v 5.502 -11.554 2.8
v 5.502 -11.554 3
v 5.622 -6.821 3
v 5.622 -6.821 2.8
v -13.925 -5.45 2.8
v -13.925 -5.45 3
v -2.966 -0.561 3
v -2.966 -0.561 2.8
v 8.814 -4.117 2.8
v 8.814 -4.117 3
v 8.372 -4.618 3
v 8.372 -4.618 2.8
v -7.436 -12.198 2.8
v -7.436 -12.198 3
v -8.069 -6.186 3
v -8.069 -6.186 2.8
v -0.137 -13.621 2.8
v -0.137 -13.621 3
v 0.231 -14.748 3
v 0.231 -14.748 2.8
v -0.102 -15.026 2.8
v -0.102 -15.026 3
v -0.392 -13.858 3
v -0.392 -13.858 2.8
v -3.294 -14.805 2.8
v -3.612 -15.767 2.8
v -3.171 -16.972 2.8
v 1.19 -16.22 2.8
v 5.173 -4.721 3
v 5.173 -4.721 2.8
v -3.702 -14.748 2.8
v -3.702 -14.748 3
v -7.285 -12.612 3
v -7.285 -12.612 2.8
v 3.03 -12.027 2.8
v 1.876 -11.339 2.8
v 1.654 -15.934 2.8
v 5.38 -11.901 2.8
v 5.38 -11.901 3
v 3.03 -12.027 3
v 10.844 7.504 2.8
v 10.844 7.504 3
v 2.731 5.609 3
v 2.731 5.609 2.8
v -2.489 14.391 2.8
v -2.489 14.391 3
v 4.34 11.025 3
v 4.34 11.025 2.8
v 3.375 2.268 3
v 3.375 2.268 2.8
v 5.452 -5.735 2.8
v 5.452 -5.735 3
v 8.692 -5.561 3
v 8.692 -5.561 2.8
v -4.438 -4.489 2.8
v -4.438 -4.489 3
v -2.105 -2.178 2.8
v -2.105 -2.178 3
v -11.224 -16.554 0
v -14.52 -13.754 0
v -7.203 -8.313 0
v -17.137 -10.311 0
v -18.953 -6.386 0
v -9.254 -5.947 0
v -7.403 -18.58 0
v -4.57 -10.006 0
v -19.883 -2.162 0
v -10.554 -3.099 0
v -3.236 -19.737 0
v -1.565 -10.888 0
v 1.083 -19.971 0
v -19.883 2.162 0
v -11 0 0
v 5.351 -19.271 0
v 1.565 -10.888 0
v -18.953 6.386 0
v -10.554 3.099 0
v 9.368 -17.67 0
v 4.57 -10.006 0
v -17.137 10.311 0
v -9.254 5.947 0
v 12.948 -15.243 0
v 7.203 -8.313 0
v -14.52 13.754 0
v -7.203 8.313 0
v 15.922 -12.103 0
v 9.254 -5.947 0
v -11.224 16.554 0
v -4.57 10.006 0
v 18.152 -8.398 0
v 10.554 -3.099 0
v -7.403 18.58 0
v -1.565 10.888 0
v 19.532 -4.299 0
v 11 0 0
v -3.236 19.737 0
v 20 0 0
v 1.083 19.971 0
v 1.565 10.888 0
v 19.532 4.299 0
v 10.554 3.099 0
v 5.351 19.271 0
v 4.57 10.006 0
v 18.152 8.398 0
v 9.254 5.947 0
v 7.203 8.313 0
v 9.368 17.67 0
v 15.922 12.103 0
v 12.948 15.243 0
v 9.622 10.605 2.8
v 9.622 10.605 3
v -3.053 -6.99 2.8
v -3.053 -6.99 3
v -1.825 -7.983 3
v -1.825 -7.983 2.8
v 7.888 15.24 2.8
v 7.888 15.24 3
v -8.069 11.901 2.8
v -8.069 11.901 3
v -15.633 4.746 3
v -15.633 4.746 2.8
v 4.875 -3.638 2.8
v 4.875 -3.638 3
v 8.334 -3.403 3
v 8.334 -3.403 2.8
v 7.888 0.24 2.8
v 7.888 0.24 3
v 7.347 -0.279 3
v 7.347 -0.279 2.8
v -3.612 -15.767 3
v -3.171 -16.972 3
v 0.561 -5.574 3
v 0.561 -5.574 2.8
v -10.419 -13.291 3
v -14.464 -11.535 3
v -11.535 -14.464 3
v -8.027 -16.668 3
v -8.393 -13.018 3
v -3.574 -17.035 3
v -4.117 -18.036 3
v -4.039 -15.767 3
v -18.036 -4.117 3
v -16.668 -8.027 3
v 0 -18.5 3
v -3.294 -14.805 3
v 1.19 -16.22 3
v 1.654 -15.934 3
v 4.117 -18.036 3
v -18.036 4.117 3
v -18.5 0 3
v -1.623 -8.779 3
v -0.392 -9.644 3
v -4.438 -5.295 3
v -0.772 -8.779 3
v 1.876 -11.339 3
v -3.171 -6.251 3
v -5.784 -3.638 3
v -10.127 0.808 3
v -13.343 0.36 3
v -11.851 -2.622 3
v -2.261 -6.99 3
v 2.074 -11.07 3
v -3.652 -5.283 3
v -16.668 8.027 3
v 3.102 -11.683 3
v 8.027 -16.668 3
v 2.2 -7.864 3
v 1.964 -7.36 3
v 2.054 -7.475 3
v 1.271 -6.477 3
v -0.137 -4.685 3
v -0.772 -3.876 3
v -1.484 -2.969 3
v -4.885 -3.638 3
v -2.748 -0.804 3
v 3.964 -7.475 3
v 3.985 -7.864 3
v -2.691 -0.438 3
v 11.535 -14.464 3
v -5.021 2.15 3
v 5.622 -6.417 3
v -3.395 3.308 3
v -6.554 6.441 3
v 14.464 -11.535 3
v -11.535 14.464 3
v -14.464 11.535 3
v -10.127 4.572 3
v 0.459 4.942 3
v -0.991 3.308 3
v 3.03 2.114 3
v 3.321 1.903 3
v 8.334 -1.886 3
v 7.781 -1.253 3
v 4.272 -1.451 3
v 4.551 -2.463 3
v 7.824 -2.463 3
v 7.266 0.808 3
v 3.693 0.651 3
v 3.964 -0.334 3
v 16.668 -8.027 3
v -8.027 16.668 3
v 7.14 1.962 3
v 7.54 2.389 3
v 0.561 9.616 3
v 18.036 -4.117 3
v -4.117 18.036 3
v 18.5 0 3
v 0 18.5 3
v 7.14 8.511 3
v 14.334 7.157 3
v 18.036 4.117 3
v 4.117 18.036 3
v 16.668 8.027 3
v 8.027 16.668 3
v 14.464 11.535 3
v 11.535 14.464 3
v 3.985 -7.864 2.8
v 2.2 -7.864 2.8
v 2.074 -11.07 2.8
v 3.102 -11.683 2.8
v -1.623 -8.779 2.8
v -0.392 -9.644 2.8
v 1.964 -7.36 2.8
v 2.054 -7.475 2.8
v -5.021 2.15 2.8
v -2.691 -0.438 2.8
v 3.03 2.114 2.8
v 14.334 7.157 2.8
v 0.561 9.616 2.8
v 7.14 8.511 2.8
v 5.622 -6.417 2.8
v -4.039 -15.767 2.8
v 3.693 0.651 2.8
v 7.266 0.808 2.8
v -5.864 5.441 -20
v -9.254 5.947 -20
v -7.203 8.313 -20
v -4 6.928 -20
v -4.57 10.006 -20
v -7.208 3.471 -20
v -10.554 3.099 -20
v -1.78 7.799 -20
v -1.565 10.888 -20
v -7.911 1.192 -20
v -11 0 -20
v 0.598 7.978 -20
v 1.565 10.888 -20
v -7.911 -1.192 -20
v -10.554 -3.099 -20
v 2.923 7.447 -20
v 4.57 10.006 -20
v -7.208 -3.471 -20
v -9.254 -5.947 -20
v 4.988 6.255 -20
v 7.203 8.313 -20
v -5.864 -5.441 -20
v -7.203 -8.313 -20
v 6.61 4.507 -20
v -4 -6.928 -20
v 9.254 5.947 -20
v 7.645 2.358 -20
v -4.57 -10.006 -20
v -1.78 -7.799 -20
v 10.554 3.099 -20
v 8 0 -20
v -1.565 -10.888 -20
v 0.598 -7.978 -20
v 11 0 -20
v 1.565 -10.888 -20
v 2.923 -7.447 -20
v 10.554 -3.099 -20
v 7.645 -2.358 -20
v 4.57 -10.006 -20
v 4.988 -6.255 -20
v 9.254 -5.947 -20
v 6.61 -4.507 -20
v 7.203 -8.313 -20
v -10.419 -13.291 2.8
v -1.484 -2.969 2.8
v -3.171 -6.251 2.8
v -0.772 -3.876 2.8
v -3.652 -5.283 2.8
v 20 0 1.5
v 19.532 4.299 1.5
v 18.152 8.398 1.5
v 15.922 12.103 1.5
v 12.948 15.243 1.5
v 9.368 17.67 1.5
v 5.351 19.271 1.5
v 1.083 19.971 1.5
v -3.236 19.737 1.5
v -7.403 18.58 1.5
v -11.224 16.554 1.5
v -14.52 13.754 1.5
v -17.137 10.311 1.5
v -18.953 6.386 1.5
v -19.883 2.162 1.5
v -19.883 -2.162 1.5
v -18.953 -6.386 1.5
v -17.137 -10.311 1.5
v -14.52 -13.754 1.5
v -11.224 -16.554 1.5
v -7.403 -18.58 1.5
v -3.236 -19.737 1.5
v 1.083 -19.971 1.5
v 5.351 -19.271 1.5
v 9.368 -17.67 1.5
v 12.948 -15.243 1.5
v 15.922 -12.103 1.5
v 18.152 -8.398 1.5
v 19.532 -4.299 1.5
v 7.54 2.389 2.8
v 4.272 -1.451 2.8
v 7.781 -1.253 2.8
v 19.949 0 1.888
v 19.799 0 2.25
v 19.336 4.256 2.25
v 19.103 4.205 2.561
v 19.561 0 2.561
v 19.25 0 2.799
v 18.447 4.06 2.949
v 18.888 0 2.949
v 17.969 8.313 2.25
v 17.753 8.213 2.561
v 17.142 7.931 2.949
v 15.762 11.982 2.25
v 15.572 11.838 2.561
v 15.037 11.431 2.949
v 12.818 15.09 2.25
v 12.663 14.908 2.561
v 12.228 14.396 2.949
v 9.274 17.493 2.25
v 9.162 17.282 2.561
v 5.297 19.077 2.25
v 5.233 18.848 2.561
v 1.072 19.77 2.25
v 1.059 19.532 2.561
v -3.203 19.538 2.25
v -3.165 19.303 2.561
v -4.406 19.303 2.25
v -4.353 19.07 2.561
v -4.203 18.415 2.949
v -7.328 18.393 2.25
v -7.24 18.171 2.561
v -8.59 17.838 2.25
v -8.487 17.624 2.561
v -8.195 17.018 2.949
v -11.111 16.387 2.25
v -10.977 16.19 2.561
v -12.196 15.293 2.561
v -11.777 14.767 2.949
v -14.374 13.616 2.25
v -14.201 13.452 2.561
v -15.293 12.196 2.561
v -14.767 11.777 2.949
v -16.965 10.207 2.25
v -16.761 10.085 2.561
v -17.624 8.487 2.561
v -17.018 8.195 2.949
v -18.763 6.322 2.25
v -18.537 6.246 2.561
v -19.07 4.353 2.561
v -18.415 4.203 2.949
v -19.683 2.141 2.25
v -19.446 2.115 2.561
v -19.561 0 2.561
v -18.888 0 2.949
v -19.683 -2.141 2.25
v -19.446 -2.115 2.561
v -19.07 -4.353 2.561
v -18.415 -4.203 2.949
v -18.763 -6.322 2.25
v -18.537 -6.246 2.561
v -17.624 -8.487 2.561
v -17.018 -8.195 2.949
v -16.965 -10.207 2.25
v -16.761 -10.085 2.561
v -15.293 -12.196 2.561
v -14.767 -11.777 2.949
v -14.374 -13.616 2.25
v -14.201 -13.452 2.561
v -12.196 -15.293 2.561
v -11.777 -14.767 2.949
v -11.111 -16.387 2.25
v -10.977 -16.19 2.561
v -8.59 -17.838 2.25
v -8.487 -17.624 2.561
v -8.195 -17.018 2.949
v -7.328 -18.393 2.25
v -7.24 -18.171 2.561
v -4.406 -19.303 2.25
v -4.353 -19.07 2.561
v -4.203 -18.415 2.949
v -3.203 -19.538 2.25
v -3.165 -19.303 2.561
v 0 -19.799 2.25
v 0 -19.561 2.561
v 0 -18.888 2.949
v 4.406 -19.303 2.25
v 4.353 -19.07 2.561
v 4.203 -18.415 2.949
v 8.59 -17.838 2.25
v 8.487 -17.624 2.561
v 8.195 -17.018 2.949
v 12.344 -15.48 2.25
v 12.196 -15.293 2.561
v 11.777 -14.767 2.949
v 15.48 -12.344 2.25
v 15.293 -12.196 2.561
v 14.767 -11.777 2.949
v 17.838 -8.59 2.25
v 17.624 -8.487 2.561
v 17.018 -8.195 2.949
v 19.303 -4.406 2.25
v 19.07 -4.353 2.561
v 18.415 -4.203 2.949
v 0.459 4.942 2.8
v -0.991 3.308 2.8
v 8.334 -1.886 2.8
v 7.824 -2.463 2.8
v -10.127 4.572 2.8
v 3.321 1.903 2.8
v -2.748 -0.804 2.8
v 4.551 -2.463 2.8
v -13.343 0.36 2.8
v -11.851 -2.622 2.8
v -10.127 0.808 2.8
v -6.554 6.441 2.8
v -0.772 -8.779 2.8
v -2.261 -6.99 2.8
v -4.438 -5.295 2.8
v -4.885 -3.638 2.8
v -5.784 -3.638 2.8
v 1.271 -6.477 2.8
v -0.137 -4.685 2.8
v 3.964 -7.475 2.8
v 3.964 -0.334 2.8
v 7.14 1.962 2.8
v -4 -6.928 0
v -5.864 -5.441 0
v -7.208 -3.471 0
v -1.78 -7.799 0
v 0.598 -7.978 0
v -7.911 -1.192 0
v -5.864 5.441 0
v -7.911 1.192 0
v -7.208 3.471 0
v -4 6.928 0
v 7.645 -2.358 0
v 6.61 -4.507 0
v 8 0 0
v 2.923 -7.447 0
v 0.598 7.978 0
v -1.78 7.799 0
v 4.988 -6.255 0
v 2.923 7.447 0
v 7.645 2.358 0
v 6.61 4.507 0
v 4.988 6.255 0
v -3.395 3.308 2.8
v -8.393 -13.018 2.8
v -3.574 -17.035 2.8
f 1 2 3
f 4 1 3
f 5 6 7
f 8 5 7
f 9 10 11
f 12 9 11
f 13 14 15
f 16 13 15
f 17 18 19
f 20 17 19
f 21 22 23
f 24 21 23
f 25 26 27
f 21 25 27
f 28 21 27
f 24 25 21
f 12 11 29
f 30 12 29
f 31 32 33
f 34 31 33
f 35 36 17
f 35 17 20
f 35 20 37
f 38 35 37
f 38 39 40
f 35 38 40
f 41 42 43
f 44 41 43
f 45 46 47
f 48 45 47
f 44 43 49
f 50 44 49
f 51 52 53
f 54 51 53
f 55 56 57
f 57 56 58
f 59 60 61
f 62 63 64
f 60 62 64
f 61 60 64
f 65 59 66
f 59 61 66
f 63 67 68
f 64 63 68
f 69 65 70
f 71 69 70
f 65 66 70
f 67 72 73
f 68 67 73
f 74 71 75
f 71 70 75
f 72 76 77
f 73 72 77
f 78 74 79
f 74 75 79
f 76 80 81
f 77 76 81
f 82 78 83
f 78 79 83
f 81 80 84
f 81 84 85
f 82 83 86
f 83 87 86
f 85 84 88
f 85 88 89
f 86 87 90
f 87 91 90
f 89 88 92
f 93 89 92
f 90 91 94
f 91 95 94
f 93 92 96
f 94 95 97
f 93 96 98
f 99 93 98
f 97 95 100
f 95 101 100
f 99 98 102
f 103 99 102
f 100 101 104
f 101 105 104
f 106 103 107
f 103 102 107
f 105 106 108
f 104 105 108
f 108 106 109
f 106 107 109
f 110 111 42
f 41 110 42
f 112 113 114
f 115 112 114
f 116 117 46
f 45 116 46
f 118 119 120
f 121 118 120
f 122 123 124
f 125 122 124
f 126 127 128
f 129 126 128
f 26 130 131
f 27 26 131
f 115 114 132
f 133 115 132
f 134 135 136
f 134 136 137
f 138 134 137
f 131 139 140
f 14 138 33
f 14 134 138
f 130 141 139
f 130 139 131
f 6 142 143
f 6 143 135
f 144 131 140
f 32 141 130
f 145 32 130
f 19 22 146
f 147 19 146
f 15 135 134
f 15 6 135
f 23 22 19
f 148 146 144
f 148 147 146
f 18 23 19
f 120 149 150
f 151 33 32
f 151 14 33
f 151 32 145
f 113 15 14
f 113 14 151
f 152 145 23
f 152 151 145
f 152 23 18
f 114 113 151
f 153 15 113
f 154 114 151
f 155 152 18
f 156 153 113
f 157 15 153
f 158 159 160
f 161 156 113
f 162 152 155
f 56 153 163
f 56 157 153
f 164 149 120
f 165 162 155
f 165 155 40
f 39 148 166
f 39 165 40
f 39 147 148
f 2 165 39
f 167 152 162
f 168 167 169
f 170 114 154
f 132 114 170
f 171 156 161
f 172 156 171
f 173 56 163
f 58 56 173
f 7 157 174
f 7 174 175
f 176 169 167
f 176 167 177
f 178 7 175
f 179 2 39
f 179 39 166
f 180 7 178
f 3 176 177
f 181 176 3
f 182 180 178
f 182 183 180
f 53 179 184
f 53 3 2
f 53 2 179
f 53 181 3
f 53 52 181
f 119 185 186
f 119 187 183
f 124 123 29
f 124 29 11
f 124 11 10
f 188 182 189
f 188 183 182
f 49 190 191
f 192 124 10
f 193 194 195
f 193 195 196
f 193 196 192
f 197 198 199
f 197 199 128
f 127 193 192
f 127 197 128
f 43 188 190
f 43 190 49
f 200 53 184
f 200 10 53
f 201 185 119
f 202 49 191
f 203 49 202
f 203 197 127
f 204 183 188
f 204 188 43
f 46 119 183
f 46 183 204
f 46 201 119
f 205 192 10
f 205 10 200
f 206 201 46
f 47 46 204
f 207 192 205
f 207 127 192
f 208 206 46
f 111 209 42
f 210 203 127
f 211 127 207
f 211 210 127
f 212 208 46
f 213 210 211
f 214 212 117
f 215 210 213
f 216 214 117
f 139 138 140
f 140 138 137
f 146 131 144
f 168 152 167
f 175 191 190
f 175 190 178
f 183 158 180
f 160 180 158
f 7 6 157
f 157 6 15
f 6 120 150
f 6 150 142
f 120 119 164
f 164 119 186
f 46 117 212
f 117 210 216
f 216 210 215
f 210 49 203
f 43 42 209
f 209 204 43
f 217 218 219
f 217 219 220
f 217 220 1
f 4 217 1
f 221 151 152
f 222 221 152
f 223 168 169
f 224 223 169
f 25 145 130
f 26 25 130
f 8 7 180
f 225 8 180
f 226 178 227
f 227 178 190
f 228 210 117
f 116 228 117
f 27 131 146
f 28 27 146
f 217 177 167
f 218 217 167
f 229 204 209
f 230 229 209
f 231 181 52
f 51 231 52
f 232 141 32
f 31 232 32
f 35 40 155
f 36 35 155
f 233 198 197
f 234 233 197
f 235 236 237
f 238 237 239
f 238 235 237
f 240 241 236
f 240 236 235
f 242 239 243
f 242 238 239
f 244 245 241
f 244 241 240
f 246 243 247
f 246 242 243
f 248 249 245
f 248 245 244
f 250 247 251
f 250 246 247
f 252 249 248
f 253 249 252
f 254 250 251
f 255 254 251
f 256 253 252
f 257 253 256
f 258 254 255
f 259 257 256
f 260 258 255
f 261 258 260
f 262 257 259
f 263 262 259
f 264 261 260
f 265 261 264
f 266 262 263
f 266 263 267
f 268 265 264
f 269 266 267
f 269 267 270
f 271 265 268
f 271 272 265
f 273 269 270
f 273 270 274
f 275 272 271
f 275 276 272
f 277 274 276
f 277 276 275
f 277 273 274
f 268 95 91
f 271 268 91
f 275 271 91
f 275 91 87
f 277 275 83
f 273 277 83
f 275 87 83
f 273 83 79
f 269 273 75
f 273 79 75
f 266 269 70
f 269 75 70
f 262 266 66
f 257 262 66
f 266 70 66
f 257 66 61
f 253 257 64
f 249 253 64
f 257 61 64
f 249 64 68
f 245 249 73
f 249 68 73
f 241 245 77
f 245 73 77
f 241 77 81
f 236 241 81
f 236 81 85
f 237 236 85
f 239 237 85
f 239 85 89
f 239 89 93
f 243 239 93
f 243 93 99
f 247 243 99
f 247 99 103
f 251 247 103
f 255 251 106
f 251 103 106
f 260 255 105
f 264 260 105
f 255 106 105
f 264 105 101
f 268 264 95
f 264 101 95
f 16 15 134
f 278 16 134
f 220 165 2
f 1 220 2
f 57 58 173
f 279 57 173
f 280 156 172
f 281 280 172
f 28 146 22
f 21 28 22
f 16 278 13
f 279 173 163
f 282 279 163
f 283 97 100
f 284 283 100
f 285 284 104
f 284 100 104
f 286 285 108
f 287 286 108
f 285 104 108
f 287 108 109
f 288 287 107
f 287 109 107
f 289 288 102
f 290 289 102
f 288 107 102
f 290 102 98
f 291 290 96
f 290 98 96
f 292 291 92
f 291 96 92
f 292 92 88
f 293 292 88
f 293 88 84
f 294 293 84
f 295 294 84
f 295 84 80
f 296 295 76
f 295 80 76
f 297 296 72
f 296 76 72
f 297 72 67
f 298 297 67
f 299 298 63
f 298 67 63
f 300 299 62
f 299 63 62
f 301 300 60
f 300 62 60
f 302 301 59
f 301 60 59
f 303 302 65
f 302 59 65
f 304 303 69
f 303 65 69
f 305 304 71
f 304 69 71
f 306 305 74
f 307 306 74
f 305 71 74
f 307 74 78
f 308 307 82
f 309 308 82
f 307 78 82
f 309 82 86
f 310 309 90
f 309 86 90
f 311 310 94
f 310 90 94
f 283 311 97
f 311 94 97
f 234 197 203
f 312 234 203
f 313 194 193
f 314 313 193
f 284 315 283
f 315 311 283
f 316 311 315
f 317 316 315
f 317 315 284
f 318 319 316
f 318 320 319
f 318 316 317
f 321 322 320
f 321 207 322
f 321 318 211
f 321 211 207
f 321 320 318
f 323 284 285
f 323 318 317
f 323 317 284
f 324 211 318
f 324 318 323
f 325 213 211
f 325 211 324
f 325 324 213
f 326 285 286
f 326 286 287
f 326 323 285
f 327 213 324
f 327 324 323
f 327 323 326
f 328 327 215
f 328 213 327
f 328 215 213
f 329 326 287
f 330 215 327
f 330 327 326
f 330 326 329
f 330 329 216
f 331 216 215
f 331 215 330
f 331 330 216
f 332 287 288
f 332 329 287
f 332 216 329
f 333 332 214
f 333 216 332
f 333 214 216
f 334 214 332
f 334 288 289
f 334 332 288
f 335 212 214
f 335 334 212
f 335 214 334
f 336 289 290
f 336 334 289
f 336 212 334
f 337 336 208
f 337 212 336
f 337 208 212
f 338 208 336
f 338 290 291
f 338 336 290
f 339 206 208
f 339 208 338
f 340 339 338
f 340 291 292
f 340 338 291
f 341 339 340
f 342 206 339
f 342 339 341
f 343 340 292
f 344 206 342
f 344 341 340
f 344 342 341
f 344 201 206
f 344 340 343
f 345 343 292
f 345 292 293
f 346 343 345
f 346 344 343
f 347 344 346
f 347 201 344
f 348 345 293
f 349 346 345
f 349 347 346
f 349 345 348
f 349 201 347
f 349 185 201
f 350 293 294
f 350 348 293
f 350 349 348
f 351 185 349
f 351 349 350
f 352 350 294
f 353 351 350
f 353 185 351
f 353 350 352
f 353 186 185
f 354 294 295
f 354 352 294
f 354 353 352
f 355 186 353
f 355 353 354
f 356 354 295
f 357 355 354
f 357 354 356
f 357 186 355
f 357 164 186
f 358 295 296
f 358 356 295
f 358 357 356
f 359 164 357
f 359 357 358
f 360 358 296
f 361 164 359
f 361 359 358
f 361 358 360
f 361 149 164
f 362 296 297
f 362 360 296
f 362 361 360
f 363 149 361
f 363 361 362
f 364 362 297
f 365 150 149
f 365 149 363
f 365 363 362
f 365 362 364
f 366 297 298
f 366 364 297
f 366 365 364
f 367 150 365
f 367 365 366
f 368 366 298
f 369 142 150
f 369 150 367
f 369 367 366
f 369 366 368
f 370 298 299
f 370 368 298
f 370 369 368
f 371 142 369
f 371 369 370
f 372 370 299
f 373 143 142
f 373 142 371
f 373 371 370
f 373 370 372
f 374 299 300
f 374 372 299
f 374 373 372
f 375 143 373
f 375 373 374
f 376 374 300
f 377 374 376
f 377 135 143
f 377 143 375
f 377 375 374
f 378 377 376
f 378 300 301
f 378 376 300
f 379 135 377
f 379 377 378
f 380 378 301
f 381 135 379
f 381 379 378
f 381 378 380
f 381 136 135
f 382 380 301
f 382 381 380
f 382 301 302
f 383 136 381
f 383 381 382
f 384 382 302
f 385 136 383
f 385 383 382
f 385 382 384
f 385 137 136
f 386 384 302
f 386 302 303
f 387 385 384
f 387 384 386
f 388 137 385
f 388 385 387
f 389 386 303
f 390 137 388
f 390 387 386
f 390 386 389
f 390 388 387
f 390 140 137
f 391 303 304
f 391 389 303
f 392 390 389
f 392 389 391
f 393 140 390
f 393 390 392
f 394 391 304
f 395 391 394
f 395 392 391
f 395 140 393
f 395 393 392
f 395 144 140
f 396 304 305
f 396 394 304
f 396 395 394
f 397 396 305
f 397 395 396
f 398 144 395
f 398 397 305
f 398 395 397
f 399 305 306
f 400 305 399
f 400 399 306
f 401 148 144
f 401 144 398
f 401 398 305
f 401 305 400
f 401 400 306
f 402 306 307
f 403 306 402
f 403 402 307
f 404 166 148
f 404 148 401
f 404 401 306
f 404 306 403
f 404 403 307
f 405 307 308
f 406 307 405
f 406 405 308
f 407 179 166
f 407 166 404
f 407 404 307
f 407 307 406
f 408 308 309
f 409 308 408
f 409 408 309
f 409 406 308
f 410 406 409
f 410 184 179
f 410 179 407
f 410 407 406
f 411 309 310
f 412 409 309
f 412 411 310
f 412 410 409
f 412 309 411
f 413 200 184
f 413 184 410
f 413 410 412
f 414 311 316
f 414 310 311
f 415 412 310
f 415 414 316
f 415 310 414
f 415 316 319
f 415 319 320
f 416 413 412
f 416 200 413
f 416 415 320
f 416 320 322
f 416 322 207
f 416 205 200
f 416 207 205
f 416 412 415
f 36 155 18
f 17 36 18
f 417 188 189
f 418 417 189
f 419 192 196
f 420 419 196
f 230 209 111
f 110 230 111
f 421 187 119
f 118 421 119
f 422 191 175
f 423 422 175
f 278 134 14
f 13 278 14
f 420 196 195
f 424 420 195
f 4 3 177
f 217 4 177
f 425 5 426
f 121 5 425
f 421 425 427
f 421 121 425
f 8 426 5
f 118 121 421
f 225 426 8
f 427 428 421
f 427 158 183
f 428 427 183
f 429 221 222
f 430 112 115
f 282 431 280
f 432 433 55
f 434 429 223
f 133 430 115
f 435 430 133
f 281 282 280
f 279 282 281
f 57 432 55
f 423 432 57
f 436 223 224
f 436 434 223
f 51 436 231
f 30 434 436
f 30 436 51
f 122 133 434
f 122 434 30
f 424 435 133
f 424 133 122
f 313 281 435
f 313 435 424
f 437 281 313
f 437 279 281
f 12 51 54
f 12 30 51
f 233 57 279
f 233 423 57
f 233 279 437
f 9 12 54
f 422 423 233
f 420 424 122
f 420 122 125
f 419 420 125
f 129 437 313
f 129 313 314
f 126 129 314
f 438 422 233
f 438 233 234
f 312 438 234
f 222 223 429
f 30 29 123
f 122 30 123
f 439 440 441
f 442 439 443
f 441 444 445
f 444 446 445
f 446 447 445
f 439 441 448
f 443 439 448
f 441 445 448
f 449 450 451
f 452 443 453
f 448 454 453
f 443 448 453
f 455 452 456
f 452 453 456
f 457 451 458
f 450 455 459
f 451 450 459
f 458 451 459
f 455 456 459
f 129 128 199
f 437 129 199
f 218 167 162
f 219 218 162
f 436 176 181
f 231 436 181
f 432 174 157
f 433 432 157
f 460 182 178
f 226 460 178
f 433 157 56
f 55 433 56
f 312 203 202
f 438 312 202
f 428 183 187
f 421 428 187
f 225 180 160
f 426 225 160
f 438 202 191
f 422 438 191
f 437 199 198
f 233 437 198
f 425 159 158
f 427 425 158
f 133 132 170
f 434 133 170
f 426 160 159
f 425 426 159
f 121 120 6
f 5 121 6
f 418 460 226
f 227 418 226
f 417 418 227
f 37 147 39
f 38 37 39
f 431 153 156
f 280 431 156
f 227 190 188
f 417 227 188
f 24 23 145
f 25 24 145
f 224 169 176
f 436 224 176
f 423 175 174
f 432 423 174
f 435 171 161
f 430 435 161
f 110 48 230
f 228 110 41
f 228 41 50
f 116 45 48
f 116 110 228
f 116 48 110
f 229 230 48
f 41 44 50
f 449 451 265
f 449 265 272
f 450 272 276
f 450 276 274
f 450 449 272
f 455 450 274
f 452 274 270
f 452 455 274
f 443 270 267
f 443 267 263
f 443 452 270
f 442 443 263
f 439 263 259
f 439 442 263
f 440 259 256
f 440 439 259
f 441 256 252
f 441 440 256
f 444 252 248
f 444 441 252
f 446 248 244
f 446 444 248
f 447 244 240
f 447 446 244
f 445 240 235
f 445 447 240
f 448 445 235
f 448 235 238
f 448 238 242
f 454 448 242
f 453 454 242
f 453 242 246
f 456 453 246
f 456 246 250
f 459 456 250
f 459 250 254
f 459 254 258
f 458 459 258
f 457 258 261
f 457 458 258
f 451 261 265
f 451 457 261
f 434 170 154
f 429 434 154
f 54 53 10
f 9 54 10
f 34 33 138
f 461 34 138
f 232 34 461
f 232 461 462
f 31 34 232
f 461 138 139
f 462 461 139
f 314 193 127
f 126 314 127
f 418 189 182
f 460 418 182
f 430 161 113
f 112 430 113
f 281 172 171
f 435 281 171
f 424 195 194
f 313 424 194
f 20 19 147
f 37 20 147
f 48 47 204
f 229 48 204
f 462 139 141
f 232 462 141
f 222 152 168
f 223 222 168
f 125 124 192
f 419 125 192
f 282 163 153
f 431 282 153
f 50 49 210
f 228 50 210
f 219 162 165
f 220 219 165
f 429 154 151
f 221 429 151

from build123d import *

# Parameters (mm, degrees)
F0_R     = 20
F1_DEPTH = 3
F2_R     = 20.25
F2_R_2   = 20
F3_DEPTH = 3
F5_DEPTH = 0.2
F6_R     = 1.5
F7_R     = 11
F7_R_2   = 8
F8_DEPTH = 20


with BuildPart() as f1:
    # F0 (on Top) → F1 (new body)
    with BuildSketch(Plane.XY):
        Circle(F0_R)
    extrude(amount=F1_DEPTH)

    # F2 (on face) → F3 (cut)
    with BuildSketch(Plane(origin=(0, 0, 0), x_dir=(1, 0, 0), z_dir=(0, 0, -1))):
        Circle(F2_R)
        Circle(F2_R_2, mode=Mode.SUBTRACT)
    extrude(amount=-F3_DEPTH, mode=Mode.SUBTRACT)

    # F4 (on face) → F5 (cut)
    with BuildSketch(Plane.XY.offset(3)):
        Polygon((-6.553545, 6.441406), (-10.126568, 4.57168), (-8.068945, 11.901424), (-15.633037, 4.746201), (-13.924567, -5.449917), (-2.965713, -0.560796), (-5.021182, 2.150405), (-11.850991, -2.621582), (-13.342778, 0.3595), (-10.126568, 0.808129), align=None)
        Polygon((-2.489465, 14.390621), (4.339508, 11.025493), (0.561338, 9.6156), (7.140174, 8.511416), (9.622473, 10.605087), (10.844337, 7.503583), (2.730879, 5.608866), (3.375366, 2.268177), (14.33422, 7.157298), (7.887996, 15.239742), align=None)
        Polygon((-0.990919, 3.307807), (-3.394604, 3.307807), (-2.691304, -0.438372), (3.029758, 2.113989), (0.458553, 4.941968), align=None)
        Polygon((1.963912, -7.359985), (2.05385, -7.474527), (3.964488, -7.474527), (5.622064, -6.417363), (5.452343, -5.734665), (8.692019, -5.561052), (8.814289, -4.11721), (8.372472, -4.618176), (5.173013, -4.720715), (4.874605, -3.637509), (8.333541, -3.403418), (8.333541, -1.885541), (7.824205, -2.463065), (4.551061, -2.463065), (4.272204, -1.450831), (7.780703, -1.253439), (7.887996, 0.240209), (7.347112, -0.279066), (3.964488, -0.333842), (3.693176, 0.651006), (7.265975, 0.808129), (7.54025, 2.389176), (7.140174, 1.96216), (3.320525, 1.903422), (-2.747671, -0.803809), (-4.885467, -3.637509), (-5.783685, -3.637509), (-4.438388, -4.488719), (-2.104728, -2.178321), (-1.484141, -2.968676), (-3.652246, -5.282777), (-4.438388, -5.294866), (-3.170688, -6.251243), (-0.771632, -3.876101), (-0.136667, -4.684767), (-2.260593, -6.990367), (-3.052734, -6.990367), (-1.825474, -7.983332), (0.561338, -5.57372), (1.270919, -6.477416), (-0.771632, -8.778695), (-1.6229, -8.778695), (-0.392072, -9.644426), align=None)
        Polygon((3.985386, -7.864483), (2.199684, -7.864483), (2.073994, -11.069699), (3.102296, -11.682914), (5.501691, -11.554331), (5.622064, -6.820647), align=None)
        Polygon((3.029758, -12.026839), (1.876301, -11.338989), (-0.136667, -13.621443), (0.230974, -14.74811), (1.653607, -15.934166), (5.380382, -11.90087), align=None)
        Polygon((-0.101783, -15.026066), (-0.392072, -13.858383), (-3.294068, -14.80533), (-3.612137, -15.766781), (-3.170688, -16.971571), (1.190486, -16.220126), align=None)
        Polygon((-7.284677, -12.611533), (-8.39267, -13.017515), (-3.574296, -17.034617), (-4.038847, -15.766781), (-3.701848, -14.74811), align=None)
        Polygon((-10.419287, -13.290767), (-7.436289, -12.19776), (-8.068945, -6.186221), align=None)
    extrude(amount=-F5_DEPTH, mode=Mode.SUBTRACT)

    # F6
    f6_edges = [f1.edges().sort_by_distance(p)[0] for p in [
        (-20, 0, 3),
    ]]
    fillet(f6_edges, radius=F6_R)

    # F7 (on face) → F8 (join)
    with BuildSketch(Plane(origin=(0, 0, 0), x_dir=(1, 0, 0), z_dir=(0, 0, -1))):
        Circle(F7_R)
        Circle(F7_R_2, mode=Mode.SUBTRACT)
    extrude(amount=F8_DEPTH)


solid = f1.part
